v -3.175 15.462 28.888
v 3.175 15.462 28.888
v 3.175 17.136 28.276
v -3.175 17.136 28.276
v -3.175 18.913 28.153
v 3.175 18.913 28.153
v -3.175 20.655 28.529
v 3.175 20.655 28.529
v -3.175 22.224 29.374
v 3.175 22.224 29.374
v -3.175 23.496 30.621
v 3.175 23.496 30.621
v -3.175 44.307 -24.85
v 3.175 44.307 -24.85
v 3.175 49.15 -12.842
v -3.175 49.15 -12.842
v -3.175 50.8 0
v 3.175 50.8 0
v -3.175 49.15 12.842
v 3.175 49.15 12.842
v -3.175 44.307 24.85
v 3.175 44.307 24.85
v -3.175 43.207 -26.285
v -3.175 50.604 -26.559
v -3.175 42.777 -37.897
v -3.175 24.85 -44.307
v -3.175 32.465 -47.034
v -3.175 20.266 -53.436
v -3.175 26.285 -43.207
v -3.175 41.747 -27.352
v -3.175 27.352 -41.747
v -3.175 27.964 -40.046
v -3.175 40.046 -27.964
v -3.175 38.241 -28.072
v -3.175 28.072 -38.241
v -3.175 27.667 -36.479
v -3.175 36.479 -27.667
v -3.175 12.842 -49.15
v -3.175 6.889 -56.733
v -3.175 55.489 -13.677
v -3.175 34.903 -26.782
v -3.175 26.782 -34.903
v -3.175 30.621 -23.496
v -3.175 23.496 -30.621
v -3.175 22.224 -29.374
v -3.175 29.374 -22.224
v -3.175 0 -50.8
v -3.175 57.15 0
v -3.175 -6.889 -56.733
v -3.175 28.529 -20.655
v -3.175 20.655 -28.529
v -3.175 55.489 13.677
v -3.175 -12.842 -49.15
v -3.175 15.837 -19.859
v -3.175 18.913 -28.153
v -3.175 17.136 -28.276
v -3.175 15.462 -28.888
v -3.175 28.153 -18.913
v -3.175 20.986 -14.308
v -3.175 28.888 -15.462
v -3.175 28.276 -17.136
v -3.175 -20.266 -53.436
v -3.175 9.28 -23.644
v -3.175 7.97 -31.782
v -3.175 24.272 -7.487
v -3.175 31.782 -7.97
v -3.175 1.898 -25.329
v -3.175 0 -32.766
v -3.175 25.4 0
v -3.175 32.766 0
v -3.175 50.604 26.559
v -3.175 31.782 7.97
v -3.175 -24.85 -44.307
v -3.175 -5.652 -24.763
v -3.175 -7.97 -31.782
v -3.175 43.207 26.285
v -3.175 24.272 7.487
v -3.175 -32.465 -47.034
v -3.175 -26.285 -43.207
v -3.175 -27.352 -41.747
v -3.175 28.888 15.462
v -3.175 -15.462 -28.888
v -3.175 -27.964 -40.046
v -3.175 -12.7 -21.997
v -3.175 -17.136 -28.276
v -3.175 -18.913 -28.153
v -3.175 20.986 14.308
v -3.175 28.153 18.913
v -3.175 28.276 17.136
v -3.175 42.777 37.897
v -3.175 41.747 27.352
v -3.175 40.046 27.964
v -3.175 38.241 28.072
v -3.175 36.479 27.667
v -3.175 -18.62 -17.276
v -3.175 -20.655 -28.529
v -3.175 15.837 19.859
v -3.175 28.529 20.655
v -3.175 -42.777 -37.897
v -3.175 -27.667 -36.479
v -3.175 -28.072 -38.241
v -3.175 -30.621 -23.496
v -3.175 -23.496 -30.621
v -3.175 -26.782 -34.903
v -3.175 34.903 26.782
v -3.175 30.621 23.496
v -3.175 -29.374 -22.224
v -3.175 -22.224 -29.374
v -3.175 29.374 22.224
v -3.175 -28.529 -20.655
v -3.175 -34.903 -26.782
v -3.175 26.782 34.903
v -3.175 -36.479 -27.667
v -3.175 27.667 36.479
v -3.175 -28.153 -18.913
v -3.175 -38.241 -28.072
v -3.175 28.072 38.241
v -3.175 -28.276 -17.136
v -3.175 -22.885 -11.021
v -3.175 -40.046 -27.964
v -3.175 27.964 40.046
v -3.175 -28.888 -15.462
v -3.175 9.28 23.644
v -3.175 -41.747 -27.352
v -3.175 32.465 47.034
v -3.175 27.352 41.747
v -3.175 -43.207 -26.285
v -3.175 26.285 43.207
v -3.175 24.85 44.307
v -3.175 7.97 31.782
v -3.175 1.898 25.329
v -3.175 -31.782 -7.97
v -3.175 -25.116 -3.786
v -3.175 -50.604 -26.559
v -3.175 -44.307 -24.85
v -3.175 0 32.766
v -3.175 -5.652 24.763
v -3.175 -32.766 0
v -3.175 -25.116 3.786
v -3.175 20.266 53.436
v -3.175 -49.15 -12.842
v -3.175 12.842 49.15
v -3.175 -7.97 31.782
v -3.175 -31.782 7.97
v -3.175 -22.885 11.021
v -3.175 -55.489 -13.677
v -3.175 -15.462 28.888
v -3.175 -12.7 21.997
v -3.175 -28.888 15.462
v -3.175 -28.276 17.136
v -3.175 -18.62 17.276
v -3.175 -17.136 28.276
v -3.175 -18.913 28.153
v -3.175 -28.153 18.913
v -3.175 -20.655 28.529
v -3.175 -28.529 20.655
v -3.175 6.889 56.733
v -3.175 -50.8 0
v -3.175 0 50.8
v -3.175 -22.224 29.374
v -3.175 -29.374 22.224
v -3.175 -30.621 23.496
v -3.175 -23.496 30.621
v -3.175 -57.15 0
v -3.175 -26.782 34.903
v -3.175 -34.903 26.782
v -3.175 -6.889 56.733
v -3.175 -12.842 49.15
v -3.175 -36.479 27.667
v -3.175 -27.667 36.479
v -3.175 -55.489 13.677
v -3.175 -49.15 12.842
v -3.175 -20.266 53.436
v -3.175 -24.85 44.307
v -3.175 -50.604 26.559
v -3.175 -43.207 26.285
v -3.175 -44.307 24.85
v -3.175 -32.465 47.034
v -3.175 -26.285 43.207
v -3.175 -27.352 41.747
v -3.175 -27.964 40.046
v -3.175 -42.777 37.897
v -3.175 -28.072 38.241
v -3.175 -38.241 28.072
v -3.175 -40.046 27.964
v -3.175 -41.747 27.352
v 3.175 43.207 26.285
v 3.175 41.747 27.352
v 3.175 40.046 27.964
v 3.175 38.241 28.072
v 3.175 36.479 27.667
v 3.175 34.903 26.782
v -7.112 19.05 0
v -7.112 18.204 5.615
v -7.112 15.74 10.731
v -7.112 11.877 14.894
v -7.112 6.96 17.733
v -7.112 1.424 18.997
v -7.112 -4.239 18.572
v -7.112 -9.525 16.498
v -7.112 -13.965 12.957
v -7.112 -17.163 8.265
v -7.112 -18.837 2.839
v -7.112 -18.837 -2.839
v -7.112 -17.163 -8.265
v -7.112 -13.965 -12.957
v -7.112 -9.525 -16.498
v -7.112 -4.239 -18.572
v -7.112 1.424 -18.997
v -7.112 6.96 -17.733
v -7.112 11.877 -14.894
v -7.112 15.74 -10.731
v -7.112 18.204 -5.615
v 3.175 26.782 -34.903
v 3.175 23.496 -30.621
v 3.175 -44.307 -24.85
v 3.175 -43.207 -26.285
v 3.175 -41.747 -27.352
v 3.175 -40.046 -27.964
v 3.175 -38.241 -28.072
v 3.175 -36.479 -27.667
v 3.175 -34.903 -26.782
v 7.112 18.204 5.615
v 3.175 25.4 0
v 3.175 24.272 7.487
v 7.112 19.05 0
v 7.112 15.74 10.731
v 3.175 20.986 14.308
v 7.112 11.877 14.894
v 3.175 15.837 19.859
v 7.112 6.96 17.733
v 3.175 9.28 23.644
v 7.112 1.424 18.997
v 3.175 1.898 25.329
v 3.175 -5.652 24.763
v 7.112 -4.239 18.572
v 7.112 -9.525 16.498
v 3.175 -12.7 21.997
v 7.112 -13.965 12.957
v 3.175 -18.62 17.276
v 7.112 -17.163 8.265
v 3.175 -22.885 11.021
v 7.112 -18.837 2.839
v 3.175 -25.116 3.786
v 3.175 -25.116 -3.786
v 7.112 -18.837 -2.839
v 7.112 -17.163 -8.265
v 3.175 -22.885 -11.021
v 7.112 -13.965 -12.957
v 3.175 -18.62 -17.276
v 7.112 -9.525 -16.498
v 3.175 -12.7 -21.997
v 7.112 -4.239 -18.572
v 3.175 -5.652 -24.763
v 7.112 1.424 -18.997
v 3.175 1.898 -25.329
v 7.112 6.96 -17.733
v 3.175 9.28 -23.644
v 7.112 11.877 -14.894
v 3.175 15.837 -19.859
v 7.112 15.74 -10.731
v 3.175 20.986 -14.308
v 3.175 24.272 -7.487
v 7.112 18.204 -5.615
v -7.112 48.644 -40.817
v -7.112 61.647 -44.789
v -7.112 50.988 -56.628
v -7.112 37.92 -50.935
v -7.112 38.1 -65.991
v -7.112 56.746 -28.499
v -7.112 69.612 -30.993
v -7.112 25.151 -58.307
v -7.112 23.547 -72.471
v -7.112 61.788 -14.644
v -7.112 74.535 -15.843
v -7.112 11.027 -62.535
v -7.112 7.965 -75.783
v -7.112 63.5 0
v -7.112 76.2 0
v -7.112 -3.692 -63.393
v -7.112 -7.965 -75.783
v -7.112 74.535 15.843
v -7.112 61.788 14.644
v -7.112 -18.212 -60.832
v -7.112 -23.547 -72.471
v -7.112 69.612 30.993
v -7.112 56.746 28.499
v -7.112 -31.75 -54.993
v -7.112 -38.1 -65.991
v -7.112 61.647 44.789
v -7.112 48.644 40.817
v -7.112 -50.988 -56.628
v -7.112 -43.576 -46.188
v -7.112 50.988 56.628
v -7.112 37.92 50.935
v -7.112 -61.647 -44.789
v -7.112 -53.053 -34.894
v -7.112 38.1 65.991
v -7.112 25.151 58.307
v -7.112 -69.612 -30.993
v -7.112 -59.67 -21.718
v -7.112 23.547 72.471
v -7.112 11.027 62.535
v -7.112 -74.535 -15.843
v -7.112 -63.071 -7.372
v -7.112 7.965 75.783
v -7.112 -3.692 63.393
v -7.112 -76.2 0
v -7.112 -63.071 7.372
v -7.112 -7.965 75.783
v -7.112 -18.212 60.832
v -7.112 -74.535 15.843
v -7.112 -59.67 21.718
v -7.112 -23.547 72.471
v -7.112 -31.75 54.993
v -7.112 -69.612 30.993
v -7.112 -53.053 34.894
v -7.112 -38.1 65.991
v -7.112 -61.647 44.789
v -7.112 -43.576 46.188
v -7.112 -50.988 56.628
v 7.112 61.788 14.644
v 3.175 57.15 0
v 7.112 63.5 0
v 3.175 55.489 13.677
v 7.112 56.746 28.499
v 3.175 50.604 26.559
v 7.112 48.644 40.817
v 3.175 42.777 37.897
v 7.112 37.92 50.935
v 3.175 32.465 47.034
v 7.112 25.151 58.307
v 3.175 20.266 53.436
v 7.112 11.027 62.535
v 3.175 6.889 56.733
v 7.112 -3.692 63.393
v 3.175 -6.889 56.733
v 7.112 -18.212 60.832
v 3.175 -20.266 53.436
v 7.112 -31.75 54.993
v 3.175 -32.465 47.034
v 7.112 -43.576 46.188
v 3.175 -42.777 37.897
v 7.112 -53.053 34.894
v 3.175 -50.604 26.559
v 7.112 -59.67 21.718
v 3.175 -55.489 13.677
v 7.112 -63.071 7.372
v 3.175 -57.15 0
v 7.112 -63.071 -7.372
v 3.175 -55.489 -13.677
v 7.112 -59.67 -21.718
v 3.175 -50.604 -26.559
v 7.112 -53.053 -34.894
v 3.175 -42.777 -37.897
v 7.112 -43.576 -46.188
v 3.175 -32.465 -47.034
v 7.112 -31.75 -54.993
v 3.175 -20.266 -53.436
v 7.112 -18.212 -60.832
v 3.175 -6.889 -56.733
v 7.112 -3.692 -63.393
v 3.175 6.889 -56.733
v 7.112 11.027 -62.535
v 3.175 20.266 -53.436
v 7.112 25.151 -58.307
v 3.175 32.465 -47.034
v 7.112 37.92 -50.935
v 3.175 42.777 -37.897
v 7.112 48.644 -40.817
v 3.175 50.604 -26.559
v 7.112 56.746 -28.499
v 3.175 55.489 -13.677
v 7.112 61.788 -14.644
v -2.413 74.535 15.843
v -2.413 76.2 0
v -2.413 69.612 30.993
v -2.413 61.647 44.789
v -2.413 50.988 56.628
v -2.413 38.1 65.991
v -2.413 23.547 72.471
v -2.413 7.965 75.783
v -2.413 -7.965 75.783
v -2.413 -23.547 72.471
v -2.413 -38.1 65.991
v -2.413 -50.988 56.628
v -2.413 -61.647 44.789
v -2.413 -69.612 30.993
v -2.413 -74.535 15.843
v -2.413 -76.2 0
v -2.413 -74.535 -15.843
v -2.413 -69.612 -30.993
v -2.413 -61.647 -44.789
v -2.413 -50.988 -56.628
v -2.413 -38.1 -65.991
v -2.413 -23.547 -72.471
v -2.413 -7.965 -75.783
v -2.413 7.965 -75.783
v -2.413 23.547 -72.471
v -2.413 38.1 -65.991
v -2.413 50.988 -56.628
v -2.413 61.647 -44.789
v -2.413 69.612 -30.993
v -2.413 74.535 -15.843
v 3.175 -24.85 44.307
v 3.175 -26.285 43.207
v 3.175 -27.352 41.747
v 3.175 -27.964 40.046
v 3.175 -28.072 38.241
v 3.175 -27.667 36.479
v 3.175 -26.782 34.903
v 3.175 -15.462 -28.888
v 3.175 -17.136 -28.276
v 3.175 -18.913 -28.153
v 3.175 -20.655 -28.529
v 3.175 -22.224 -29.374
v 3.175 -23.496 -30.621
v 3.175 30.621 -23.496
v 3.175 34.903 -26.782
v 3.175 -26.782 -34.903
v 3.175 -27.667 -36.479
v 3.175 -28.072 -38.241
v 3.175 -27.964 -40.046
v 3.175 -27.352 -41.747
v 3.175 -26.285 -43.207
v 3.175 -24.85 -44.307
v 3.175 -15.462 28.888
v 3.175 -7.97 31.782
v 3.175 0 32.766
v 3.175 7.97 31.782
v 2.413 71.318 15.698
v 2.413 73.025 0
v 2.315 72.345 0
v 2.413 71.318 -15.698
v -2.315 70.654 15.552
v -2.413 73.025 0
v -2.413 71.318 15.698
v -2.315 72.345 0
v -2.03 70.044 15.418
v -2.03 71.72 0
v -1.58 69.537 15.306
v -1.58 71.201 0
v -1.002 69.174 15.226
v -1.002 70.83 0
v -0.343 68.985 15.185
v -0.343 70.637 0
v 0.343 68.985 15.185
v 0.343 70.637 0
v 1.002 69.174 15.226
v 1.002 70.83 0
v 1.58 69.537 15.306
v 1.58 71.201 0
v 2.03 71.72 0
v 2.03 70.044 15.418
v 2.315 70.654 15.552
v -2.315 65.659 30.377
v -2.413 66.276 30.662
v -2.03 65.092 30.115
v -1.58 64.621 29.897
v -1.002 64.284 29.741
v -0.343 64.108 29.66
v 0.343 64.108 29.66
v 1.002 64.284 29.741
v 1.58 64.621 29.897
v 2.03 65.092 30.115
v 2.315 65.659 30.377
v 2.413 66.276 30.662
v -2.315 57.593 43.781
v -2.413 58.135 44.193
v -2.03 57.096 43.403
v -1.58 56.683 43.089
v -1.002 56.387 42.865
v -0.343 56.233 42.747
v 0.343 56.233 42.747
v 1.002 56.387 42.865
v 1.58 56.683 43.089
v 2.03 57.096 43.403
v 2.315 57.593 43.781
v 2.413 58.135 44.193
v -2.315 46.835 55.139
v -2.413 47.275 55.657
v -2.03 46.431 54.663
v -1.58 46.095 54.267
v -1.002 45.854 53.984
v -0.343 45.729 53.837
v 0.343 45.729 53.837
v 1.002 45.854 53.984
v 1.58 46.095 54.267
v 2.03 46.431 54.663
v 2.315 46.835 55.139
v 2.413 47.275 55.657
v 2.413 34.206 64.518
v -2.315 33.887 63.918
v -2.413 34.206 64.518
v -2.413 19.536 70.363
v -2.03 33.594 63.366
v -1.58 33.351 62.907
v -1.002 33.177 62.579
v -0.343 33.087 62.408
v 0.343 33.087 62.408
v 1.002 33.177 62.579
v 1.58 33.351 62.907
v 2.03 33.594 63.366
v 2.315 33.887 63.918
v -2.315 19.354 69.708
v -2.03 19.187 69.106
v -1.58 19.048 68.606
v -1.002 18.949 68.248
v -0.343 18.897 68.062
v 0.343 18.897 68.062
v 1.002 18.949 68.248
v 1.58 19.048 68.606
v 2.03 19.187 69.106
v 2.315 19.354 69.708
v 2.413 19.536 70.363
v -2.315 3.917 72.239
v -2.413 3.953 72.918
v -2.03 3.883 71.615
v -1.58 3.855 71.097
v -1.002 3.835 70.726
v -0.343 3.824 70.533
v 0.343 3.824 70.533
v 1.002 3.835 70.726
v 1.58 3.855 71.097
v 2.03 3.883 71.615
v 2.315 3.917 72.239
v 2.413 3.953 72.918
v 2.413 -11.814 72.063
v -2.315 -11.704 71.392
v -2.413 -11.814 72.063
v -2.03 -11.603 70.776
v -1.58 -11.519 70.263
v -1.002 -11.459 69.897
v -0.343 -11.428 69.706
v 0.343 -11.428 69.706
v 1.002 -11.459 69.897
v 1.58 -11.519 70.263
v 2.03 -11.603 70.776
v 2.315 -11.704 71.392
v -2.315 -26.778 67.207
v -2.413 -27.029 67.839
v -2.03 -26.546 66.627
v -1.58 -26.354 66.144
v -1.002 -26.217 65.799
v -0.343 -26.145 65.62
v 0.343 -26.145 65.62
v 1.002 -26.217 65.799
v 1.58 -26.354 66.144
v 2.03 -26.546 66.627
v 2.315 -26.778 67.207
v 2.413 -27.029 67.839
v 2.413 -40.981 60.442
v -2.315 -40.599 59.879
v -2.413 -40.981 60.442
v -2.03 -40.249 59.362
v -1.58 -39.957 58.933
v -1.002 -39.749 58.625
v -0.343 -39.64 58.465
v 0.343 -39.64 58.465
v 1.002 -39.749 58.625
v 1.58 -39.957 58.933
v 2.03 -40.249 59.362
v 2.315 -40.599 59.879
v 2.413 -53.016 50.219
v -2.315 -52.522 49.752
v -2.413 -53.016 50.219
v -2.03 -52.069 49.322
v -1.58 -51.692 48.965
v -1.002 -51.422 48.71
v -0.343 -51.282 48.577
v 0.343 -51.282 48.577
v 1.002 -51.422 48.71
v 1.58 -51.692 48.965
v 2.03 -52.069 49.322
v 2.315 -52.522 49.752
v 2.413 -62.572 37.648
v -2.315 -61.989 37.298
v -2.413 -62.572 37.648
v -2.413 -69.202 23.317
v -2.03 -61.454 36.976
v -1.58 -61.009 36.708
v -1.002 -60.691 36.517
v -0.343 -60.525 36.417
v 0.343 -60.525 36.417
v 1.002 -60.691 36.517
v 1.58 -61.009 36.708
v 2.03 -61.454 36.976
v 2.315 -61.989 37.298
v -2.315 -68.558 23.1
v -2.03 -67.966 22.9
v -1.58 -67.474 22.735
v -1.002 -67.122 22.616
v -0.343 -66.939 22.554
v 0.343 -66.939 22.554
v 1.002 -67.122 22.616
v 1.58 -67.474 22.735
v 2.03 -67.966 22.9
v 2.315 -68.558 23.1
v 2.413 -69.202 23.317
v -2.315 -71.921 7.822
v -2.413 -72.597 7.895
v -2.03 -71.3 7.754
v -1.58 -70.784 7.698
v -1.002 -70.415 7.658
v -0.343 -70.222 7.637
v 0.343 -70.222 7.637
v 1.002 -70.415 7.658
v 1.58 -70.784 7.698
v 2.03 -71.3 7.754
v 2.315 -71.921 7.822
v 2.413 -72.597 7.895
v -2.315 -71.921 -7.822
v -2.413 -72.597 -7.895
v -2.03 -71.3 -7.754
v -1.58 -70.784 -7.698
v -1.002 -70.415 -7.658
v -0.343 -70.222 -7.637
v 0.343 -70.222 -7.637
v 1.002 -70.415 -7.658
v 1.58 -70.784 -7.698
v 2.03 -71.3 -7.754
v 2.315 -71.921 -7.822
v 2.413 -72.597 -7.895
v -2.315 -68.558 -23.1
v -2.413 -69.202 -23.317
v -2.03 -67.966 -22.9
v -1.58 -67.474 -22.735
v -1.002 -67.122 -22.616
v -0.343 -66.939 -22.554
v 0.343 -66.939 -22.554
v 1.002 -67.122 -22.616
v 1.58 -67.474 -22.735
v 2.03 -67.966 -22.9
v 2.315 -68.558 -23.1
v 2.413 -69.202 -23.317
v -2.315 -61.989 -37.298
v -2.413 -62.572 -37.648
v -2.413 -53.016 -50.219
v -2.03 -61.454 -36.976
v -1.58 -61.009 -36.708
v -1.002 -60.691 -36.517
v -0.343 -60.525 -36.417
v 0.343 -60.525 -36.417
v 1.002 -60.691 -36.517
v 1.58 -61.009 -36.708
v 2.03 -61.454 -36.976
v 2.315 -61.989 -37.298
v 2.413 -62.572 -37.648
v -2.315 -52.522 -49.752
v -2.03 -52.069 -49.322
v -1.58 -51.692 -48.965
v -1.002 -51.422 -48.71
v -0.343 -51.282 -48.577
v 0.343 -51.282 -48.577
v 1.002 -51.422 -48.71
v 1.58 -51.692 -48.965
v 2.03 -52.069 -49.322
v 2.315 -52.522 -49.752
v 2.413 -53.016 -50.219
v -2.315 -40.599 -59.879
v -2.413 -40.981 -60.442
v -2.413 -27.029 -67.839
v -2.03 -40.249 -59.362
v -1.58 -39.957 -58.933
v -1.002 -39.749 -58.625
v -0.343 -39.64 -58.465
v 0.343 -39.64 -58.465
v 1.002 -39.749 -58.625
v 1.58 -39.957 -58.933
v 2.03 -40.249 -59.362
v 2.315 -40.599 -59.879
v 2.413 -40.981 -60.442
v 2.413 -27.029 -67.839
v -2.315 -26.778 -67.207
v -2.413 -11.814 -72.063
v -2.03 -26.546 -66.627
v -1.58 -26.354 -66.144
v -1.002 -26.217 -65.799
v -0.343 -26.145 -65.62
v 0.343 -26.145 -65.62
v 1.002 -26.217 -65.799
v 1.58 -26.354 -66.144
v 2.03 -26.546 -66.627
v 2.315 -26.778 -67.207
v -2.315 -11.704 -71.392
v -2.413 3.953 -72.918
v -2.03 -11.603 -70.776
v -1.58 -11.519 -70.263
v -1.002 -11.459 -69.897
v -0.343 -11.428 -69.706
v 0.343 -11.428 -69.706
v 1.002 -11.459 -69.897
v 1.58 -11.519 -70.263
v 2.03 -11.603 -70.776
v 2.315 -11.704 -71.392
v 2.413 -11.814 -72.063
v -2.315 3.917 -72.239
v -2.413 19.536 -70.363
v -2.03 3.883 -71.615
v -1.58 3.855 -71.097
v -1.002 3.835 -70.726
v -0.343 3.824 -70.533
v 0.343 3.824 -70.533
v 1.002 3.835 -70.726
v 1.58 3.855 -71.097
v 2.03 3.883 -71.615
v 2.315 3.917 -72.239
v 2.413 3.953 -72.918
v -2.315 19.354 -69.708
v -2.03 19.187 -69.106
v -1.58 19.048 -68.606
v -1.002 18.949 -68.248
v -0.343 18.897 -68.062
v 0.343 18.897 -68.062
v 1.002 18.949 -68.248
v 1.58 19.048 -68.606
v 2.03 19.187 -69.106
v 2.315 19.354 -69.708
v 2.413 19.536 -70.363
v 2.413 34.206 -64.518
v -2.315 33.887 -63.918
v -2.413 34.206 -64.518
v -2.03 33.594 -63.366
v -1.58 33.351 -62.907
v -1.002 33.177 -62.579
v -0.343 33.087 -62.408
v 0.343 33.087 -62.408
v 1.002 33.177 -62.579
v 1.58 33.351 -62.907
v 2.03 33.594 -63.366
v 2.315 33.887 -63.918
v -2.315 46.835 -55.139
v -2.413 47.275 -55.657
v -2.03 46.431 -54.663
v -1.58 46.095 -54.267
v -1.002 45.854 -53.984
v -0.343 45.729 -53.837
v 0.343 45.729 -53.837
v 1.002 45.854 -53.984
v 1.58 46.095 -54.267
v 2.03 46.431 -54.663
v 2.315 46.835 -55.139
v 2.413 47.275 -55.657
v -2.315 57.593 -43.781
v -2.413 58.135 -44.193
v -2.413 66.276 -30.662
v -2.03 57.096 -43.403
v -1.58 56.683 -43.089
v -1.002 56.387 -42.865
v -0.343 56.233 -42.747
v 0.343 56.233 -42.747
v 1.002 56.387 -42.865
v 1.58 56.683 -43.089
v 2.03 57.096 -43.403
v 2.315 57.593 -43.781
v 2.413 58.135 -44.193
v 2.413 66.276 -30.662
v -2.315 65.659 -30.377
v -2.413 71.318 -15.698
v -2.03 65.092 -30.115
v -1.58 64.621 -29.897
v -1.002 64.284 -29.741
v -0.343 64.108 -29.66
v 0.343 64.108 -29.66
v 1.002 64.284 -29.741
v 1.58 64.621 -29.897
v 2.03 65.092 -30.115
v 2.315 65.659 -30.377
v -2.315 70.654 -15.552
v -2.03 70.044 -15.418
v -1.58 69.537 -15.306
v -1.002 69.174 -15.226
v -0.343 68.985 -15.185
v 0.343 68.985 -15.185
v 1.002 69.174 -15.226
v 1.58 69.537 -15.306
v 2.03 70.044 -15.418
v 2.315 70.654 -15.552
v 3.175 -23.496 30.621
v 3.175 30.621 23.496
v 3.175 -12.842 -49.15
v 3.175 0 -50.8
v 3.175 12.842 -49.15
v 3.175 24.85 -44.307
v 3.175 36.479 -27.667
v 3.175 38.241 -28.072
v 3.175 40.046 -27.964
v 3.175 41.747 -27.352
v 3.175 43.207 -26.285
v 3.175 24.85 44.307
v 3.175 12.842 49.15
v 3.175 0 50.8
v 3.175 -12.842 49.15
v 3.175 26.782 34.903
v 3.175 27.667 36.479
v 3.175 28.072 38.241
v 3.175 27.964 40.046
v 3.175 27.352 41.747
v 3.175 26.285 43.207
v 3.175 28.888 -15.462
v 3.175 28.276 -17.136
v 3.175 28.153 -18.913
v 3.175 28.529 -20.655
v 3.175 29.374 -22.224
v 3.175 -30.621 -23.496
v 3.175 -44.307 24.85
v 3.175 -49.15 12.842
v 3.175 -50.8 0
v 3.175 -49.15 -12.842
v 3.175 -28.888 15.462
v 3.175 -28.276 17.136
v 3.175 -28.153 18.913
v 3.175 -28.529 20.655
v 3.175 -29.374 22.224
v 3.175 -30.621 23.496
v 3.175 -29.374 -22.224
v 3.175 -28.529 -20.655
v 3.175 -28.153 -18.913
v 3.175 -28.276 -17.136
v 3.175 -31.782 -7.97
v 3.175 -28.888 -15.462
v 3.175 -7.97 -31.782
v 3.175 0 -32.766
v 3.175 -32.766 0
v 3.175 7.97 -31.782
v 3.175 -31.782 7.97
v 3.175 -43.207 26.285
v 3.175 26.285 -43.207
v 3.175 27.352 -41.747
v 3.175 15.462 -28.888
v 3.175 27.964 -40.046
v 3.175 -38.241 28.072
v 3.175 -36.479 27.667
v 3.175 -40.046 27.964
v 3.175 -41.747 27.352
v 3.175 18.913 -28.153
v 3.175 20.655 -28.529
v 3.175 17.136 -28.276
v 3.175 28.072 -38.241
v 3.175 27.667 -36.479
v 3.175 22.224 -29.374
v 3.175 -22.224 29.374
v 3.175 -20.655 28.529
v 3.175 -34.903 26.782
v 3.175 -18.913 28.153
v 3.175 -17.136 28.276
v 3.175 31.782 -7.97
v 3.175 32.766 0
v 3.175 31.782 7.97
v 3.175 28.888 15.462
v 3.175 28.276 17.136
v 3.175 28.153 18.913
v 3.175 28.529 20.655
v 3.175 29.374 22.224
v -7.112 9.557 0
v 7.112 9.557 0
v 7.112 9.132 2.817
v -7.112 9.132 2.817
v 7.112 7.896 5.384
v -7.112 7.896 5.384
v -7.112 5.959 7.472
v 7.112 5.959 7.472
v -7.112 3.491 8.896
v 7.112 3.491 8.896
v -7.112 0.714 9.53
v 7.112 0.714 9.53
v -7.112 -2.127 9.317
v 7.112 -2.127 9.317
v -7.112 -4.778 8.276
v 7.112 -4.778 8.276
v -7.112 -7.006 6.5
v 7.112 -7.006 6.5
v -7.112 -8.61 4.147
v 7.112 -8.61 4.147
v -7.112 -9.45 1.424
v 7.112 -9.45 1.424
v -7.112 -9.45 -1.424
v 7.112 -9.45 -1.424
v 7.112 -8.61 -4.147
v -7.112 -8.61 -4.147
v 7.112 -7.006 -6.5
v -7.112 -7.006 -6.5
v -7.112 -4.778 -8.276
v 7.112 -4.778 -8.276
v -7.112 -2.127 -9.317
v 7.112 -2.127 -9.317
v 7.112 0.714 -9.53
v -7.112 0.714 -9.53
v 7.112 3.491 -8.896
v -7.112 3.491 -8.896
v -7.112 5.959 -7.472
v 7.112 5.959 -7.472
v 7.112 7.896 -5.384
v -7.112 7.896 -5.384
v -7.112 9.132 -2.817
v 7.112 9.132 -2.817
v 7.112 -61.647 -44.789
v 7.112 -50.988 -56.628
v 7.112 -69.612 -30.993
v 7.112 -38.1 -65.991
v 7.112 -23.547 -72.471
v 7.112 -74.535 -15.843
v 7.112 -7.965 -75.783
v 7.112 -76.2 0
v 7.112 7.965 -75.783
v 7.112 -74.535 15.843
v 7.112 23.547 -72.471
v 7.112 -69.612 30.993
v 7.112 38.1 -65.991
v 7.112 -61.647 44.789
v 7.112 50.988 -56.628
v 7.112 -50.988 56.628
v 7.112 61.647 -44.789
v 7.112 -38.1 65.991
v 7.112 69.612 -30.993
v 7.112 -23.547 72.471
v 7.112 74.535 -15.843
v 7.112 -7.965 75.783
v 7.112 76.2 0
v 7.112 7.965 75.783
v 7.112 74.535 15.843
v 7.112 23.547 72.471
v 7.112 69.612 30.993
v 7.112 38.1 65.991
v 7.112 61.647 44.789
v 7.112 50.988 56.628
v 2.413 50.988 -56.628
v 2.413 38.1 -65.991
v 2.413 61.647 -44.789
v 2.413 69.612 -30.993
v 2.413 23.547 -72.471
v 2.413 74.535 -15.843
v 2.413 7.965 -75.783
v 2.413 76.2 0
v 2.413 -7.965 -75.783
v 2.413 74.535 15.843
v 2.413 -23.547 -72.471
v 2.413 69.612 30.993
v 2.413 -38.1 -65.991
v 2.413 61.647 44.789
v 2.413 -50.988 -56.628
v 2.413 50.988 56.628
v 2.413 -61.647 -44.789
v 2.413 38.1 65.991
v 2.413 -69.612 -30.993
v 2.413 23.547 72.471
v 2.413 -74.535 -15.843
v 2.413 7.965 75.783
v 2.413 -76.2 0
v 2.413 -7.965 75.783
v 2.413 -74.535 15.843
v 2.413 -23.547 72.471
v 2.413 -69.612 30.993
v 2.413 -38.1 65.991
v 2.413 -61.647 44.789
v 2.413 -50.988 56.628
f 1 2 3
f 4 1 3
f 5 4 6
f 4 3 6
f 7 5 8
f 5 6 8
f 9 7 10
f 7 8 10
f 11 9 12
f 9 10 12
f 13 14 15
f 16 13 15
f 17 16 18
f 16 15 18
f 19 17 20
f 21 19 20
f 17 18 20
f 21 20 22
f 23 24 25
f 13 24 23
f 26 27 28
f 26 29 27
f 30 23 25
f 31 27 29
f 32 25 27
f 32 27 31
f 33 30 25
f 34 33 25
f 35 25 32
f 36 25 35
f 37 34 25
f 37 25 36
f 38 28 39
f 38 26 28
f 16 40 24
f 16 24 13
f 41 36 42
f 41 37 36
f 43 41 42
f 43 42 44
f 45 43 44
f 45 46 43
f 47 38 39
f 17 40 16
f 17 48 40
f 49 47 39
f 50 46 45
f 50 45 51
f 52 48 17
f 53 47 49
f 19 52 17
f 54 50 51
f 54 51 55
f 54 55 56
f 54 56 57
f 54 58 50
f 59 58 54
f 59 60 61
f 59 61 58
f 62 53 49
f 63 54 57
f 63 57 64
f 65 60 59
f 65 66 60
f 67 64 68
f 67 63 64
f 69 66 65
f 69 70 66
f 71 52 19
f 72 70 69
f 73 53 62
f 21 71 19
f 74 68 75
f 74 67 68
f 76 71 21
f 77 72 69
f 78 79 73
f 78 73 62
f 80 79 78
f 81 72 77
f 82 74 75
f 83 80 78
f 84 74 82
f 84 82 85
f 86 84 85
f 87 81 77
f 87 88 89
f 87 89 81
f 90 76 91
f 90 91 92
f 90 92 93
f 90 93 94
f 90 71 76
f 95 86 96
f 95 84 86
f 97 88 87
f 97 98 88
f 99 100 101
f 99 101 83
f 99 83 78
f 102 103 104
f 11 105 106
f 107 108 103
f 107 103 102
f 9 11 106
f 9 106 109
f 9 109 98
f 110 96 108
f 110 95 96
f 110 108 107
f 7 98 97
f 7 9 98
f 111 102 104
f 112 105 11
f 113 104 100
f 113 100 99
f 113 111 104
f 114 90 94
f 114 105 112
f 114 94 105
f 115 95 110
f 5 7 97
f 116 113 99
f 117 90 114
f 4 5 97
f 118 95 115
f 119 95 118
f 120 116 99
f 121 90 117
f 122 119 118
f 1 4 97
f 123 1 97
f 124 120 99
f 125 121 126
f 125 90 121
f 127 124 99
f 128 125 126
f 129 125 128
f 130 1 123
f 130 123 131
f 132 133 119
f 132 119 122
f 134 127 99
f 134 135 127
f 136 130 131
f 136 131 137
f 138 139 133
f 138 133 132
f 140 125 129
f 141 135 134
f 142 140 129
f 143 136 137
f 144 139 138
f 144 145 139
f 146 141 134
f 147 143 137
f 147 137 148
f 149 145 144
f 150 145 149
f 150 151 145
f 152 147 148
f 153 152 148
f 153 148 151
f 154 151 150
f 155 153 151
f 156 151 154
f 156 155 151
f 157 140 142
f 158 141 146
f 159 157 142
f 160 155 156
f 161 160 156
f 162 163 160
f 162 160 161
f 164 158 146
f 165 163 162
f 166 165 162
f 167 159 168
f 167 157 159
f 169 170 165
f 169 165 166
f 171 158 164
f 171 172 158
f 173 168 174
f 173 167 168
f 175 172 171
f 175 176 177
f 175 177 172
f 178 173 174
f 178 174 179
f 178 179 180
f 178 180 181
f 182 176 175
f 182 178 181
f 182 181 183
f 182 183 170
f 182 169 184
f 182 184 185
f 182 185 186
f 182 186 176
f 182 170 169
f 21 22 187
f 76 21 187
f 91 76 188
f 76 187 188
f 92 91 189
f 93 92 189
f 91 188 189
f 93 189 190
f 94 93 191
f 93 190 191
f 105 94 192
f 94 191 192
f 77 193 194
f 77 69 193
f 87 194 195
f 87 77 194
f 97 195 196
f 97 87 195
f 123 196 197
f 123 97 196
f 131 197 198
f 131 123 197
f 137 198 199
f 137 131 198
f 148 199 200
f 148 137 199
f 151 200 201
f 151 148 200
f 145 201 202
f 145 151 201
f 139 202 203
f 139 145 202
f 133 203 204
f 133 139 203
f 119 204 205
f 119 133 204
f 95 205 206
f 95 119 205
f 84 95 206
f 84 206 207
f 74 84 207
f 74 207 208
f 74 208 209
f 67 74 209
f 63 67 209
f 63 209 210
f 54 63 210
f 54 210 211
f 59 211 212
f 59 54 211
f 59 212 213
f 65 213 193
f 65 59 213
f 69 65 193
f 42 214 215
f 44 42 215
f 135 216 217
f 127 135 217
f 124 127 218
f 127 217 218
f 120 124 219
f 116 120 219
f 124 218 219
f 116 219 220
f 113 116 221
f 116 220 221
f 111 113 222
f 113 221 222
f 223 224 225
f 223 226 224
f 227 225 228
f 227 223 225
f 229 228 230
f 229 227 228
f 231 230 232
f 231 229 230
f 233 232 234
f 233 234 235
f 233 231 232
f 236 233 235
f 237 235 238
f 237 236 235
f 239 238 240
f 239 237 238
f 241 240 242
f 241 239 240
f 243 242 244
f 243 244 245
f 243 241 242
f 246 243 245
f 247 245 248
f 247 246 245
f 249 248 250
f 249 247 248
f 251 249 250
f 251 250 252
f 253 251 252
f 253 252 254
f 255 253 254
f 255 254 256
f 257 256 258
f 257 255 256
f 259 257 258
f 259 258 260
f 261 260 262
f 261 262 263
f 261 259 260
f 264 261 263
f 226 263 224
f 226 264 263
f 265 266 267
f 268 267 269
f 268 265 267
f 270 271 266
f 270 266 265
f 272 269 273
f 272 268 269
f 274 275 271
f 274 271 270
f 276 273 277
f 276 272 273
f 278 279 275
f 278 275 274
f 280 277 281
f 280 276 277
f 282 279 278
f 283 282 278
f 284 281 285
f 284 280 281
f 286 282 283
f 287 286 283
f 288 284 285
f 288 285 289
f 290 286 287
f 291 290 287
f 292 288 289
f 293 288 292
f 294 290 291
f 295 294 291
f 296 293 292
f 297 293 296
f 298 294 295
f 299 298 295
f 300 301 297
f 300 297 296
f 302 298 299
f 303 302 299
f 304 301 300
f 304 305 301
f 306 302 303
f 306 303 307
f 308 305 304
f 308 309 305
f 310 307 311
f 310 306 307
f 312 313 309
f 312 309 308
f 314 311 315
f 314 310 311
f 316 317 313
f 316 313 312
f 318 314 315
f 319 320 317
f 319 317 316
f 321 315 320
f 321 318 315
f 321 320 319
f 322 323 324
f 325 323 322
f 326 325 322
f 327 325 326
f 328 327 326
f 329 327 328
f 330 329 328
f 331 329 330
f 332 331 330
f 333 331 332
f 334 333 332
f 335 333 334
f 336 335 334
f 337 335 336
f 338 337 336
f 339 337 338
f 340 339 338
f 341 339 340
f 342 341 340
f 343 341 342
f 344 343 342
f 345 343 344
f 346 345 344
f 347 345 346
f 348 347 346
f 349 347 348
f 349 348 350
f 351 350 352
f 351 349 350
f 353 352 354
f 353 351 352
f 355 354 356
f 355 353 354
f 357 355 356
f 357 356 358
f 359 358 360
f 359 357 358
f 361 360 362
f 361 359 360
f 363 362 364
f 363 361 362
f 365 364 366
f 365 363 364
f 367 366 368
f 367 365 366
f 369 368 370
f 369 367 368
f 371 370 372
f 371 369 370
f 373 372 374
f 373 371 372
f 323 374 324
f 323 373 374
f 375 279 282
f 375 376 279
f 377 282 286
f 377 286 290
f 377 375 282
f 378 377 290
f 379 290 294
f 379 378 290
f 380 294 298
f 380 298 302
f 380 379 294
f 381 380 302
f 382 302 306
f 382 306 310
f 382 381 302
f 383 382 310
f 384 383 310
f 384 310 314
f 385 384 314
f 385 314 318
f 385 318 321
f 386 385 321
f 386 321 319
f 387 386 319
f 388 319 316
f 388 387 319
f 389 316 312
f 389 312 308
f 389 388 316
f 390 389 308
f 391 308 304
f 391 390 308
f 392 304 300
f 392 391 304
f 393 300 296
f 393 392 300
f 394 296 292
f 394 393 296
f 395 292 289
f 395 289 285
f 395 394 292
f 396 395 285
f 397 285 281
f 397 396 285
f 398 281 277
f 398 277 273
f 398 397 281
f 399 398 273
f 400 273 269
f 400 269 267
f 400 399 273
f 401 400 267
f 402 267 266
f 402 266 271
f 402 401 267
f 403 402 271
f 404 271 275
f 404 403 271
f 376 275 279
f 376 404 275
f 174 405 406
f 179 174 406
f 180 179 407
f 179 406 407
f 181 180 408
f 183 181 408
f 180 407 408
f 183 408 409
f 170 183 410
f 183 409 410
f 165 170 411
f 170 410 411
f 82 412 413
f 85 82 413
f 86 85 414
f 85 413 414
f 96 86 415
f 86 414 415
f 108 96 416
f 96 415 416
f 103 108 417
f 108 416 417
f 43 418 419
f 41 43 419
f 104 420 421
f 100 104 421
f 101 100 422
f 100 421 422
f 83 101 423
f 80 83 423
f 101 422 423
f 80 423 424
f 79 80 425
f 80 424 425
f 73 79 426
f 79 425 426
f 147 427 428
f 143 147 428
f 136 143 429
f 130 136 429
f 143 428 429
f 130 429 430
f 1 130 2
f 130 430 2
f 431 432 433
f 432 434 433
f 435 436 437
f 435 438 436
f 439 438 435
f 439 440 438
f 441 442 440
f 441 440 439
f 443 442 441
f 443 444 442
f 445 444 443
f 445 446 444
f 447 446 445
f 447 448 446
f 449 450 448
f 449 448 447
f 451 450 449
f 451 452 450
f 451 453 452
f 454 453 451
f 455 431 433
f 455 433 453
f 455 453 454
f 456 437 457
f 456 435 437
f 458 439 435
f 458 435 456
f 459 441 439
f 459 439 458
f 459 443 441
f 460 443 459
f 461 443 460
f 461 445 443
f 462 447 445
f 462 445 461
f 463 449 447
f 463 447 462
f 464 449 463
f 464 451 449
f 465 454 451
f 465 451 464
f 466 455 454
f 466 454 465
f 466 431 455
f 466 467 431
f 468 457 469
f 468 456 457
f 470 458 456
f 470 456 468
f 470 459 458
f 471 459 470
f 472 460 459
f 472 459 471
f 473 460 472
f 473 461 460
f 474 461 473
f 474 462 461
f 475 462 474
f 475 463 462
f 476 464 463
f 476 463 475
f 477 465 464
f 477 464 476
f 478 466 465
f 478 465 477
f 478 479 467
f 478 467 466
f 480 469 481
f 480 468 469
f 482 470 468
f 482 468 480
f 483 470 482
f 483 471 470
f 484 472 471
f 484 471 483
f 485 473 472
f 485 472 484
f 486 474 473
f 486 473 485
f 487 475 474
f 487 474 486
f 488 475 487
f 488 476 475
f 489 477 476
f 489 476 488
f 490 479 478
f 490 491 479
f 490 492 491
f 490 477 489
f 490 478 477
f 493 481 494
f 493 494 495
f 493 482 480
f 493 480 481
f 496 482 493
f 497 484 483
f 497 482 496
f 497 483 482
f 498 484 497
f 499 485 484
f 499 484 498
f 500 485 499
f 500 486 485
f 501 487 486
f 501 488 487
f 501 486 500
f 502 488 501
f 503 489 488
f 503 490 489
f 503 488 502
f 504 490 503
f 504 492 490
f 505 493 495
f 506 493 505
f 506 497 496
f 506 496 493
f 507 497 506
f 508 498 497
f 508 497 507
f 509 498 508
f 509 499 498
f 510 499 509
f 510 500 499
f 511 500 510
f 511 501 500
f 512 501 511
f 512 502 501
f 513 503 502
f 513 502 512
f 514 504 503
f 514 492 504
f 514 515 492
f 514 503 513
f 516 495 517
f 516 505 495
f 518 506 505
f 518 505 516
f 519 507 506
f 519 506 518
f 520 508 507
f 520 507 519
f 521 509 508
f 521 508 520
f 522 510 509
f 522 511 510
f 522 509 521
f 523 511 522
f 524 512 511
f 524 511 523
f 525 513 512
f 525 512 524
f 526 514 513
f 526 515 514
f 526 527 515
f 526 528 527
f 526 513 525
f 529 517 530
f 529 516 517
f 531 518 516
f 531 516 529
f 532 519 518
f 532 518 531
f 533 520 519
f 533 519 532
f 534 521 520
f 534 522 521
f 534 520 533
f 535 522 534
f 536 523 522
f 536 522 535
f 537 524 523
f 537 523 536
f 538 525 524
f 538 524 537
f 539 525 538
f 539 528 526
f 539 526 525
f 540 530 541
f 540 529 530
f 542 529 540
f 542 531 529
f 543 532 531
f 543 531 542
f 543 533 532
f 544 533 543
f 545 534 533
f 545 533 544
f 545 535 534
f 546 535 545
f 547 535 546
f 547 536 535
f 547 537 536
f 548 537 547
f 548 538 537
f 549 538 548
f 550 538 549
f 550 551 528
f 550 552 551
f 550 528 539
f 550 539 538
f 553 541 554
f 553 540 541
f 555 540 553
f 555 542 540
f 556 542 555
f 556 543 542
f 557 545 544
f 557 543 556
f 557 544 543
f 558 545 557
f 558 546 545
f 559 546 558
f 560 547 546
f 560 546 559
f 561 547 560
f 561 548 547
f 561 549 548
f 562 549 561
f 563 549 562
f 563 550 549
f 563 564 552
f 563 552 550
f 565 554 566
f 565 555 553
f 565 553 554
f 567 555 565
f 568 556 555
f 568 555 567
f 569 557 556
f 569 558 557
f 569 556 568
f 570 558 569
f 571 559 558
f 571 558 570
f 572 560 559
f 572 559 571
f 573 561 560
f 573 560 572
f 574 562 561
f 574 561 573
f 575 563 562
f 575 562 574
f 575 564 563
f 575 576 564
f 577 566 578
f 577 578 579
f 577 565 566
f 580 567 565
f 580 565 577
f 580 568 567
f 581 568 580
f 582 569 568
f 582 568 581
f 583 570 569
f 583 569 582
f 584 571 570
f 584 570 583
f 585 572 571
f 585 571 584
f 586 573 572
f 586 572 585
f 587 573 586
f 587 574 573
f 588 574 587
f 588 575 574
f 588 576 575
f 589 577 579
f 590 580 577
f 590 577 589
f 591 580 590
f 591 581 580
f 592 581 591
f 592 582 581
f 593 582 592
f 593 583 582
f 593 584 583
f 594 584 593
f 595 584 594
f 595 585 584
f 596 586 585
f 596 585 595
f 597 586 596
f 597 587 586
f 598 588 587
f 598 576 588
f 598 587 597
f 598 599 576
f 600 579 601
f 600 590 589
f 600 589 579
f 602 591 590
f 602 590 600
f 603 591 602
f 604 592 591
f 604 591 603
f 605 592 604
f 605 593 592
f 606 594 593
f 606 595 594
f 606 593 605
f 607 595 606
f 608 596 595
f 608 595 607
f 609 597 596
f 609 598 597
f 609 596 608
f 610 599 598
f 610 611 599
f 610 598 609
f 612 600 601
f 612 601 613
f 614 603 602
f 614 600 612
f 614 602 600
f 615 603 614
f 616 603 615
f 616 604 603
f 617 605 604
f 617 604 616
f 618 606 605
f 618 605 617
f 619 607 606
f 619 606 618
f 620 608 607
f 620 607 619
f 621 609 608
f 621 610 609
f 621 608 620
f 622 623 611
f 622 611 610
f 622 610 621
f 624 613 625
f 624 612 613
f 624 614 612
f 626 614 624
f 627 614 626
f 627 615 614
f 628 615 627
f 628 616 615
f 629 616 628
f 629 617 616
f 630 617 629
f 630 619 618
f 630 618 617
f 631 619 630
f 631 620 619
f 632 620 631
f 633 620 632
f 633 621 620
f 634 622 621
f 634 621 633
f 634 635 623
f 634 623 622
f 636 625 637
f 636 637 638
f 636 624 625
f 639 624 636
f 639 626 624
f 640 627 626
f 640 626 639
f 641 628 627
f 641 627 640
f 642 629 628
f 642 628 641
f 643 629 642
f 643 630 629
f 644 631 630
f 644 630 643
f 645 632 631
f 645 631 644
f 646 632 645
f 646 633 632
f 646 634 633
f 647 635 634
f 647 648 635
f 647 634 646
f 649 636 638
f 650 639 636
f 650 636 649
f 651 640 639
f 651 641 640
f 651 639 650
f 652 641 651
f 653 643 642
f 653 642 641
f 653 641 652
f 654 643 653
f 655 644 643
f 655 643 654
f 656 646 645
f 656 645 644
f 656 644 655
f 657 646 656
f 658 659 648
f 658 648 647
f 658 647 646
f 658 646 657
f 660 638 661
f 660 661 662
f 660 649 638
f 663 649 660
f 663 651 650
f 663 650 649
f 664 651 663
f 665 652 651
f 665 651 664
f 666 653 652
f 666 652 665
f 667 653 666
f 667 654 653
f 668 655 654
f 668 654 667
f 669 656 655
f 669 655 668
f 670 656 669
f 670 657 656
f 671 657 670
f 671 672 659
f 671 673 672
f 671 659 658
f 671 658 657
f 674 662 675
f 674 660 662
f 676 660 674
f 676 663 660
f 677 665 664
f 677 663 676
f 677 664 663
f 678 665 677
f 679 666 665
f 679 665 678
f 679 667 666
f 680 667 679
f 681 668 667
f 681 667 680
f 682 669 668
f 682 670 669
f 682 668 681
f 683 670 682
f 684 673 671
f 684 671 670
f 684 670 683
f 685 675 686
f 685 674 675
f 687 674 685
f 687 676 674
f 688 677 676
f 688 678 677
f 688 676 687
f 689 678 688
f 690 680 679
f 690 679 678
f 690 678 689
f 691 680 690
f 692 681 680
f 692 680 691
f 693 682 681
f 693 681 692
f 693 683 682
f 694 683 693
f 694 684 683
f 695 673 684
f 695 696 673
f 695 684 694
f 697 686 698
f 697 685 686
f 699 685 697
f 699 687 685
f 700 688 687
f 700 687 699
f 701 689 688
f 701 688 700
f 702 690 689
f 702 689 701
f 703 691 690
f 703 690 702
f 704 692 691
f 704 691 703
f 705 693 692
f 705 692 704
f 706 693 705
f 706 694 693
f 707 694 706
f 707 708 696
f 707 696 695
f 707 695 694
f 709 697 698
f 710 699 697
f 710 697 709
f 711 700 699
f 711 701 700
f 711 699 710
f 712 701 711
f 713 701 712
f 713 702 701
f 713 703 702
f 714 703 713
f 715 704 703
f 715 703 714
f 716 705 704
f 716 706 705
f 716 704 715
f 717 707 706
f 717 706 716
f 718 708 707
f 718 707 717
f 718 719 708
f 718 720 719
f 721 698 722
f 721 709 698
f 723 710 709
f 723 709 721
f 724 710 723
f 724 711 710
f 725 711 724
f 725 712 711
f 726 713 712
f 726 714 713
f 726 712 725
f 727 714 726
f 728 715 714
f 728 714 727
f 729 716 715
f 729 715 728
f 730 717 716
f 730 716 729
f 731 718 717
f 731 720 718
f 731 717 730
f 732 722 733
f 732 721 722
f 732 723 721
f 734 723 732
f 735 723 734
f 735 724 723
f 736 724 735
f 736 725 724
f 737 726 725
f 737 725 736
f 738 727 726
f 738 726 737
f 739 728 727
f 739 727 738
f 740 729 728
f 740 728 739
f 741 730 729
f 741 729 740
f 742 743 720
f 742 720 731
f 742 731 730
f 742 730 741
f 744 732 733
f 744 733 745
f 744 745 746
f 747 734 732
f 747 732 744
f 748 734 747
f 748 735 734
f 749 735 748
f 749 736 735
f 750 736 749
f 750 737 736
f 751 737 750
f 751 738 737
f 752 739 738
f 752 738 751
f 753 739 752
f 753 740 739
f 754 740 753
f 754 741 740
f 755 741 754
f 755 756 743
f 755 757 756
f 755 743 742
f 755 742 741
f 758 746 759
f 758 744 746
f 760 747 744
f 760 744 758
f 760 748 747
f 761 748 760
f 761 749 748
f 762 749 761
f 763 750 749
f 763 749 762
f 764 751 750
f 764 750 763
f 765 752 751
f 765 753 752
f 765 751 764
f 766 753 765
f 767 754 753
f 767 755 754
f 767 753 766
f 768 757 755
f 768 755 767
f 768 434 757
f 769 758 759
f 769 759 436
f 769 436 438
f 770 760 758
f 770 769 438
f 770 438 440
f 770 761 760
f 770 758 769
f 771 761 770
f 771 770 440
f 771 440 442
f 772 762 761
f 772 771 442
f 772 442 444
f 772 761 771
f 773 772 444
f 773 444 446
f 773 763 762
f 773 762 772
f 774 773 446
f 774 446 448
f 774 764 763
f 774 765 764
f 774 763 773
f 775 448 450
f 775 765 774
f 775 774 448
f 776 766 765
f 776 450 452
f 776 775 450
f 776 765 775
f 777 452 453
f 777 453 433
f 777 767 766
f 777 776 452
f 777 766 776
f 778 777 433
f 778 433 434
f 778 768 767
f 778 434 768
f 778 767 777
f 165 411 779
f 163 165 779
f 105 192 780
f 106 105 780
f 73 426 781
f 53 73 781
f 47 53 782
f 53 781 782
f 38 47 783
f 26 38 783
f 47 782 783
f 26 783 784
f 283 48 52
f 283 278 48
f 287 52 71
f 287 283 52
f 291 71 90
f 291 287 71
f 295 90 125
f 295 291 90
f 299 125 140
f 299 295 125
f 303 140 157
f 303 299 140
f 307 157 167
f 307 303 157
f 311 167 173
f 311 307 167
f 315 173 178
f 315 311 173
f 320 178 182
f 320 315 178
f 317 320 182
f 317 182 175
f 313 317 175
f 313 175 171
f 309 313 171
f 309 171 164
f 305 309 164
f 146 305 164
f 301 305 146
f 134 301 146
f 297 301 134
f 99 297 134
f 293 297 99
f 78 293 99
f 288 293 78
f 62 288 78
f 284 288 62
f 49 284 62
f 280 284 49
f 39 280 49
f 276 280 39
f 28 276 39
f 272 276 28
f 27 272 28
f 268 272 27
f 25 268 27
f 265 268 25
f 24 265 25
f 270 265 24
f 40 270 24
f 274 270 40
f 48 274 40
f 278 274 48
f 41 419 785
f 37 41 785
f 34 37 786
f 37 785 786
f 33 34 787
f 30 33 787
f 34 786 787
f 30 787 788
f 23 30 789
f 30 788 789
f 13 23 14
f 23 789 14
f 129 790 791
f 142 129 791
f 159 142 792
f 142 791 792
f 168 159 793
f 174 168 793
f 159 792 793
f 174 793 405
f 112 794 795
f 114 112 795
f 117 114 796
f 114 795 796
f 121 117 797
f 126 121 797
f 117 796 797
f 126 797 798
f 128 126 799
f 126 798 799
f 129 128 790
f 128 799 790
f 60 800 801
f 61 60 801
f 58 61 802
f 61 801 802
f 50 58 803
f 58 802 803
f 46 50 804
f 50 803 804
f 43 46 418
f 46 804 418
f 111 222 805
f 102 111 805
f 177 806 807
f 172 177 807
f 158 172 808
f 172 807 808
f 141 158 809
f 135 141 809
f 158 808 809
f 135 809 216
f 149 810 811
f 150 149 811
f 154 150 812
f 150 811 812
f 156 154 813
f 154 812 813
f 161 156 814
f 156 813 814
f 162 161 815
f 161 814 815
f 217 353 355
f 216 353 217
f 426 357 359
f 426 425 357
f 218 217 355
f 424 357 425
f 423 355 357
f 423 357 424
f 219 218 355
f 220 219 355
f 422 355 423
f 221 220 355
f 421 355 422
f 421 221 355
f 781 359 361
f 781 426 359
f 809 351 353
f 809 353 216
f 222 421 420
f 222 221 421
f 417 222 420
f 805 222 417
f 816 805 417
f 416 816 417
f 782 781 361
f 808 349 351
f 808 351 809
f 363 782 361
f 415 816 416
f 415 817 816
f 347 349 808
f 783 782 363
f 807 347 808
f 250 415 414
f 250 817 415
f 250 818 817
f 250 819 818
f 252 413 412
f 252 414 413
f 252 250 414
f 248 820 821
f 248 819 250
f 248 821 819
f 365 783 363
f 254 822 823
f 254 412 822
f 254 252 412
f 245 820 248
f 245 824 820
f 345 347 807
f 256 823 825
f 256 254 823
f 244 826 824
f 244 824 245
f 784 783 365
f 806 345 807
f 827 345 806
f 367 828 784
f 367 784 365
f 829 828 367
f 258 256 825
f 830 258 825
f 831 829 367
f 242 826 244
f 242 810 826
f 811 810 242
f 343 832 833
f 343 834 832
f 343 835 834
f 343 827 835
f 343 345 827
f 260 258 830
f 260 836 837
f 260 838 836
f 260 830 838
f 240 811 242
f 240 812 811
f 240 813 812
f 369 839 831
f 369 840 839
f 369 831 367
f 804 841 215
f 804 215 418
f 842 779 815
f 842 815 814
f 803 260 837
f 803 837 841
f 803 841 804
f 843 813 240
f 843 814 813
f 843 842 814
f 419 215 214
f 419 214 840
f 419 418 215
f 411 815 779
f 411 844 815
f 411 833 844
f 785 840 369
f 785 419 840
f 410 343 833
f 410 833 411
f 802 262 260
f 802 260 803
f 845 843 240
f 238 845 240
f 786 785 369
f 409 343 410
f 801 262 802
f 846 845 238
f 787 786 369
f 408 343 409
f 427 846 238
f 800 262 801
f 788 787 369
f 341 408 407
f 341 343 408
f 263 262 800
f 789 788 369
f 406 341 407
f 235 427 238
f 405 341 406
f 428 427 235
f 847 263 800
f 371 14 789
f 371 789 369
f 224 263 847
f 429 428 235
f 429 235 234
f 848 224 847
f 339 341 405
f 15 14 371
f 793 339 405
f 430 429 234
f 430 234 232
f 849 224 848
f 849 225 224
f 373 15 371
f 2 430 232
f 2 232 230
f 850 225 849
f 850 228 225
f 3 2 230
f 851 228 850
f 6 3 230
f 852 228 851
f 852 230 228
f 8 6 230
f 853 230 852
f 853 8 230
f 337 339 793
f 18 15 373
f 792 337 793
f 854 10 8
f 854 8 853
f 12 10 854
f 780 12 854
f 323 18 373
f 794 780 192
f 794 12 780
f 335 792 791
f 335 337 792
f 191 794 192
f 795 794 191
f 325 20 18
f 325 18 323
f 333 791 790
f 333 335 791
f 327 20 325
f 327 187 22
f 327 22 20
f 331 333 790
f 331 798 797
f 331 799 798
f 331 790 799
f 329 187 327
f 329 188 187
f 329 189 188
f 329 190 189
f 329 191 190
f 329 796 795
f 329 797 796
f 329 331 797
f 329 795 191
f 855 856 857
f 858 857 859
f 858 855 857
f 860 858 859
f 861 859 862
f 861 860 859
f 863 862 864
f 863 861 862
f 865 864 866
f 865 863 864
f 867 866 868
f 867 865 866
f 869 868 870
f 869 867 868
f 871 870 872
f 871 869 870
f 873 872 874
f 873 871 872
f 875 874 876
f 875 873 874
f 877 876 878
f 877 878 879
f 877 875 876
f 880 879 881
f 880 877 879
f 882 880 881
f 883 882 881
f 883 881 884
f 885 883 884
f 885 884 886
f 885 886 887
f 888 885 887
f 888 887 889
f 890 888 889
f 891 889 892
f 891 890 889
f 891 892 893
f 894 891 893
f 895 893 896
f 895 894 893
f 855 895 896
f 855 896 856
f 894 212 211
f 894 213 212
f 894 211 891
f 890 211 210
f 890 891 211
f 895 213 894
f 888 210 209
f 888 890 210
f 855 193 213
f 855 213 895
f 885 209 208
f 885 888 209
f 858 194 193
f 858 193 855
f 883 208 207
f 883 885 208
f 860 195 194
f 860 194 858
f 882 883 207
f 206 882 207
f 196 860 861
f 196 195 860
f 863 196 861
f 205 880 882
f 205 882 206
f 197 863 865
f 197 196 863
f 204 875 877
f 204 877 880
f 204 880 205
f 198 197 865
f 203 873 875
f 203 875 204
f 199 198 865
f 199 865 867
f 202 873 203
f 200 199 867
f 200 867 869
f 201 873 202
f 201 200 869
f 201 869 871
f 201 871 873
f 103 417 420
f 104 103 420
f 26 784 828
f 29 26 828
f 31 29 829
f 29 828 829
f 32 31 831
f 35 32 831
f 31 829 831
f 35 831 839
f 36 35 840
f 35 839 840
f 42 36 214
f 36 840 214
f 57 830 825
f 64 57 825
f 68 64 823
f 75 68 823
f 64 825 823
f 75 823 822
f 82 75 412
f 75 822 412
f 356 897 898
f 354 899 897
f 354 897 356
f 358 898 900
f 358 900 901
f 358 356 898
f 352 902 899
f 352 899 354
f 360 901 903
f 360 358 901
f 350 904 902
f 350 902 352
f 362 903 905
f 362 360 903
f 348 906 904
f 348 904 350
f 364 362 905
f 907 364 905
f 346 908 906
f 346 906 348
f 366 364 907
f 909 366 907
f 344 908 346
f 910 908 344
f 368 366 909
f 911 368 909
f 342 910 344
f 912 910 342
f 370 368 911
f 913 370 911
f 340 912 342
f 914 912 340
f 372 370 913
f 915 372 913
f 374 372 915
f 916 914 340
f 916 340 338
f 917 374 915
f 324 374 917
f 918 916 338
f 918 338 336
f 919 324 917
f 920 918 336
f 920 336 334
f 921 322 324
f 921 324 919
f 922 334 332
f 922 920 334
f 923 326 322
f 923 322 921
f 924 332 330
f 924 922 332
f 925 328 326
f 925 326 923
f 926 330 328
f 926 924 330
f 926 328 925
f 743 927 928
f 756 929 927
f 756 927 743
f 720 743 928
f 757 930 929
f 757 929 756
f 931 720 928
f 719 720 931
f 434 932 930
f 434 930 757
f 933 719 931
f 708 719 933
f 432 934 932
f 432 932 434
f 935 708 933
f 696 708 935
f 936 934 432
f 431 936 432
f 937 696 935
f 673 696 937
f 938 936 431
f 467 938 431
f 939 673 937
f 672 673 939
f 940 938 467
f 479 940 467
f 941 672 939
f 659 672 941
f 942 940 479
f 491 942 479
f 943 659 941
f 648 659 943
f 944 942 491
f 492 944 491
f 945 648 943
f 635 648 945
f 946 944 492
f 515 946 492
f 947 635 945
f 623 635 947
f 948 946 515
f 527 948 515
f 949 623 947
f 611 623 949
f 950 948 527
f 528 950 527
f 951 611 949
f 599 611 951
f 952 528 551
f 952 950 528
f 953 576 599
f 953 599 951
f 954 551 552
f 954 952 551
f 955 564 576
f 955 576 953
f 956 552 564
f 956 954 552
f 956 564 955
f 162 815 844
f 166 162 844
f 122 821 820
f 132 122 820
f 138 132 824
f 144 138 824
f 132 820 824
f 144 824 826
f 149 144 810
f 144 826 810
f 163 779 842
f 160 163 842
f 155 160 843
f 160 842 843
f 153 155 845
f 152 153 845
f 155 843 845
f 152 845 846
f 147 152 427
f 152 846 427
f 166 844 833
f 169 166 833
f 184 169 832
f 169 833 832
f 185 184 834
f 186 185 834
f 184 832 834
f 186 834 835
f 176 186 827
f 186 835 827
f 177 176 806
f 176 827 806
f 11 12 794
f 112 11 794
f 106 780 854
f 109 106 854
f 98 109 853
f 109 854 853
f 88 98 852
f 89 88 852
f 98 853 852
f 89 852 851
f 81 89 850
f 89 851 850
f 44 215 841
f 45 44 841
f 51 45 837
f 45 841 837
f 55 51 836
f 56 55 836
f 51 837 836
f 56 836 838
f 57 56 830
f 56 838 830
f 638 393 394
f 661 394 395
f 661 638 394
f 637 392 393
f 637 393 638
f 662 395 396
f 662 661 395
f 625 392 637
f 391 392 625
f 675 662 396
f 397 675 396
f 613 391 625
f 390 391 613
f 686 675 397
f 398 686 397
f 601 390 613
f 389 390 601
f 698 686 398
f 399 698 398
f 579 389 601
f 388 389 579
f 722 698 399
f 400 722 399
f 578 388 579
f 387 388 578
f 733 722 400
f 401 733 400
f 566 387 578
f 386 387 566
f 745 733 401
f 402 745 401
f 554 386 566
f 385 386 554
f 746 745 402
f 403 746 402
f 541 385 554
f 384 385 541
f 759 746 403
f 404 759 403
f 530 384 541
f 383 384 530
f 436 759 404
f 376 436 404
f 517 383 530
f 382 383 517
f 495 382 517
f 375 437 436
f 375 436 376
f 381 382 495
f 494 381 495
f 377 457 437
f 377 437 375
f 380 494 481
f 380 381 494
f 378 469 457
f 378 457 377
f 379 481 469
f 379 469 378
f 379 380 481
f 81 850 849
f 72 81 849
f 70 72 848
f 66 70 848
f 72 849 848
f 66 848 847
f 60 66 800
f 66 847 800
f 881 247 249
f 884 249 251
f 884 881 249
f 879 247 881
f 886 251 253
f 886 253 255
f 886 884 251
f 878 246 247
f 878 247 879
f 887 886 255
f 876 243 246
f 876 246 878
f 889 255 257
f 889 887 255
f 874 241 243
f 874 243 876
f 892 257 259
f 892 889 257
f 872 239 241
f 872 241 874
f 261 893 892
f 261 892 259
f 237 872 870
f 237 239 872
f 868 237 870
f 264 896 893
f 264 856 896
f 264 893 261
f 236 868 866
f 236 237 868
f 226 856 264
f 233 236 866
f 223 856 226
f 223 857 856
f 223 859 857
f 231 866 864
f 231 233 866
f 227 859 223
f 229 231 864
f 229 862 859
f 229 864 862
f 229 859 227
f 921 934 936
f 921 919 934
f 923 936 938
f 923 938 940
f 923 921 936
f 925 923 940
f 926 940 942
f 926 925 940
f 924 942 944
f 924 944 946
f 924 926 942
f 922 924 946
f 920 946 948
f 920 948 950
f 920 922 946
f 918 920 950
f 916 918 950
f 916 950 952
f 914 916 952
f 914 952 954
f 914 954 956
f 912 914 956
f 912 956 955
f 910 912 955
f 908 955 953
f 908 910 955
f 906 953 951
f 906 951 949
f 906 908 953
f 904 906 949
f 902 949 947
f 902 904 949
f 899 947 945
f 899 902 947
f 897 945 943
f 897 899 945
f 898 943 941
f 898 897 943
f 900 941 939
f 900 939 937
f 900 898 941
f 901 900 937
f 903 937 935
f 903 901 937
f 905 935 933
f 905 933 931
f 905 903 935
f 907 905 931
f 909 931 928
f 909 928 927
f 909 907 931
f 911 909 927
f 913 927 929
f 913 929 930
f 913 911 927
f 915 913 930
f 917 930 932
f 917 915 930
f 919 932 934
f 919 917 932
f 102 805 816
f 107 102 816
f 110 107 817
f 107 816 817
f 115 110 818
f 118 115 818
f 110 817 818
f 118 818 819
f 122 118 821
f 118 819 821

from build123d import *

# Parameters (mm, degrees)
CUT_EXTRUDE1_DEPTH = 6.35
CIRPATTERN1_COUNT  = 4


with BuildPart() as part:
    # Sketch1 → Revolve1 (revolve)
    with BuildSketch(Plane.XY):
        with BuildLine():
            Line((-7.112, 19.05), (-3.175, 25.4))
            Line((-3.175, 25.4), (-3.175, 57.15))
            Line((-3.175, 57.15), (-7.112, 63.5))
            Line((-7.112, 63.5), (-7.112, 76.2))
            Line((-7.112, 76.2), (-2.413, 76.2))
            Line((-2.413, 76.2), (-2.413, 73.025))
            ThreePointArc((-2.413, 73.025), (0, 70.612), (2.413, 73.025))
            Line((2.413, 73.025), (2.413, 76.2))
            Line((2.413, 76.2), (7.112, 76.2))
            Line((7.112, 76.2), (7.112, 63.5))
            Line((7.112, 63.5), (3.175, 57.15))
            Line((3.175, 57.15), (3.175, 25.4))
            Line((3.175, 25.4), (7.112, 19.05))
            Line((7.112, 19.05), (7.112, 9.55675))
            Line((7.112, 9.55675), (-7.112, 9.55675))
            Line((-7.112, 9.55675), (-7.112, 19.05))
        make_face()
    revolve(axis=Axis((0, 0, 0), (1, 0, 0)))

    # Sketch2 → Cut-Extrude1 (cut)
    with BuildSketch(Plane(origin=(3.175, 0, 0), x_dir=(0, 0, -1), z_dir=(1, 0, 0))):
        with BuildLine():
            Line((23.49644805, 30.621167271), (26.781905408, 34.902858661))
            ThreePointArc((26.781905408, 34.902858661), (27.96426729, 40.046055634), (24.850413368, 44.306849983))
            ThreePointArc((24.850413368, 44.306849983), (0, 50.8), (-24.850413368, 44.306849983))
            ThreePointArc((-24.850413368, 44.306849983), (-27.96426729, 40.046055634), (-26.781905408, 34.902858661))
            Line((-26.781905408, 34.902858661), (-23.49644805, 30.621167271))
            ThreePointArc((-23.49644805, 30.621167271), (-19.797458156, 28.279540119), (-15.462119544, 28.888295471))
            ThreePointArc((-15.462119544, 28.888295471), (0, 32.766), (15.462119544, 28.888295471))
            ThreePointArc((15.462119544, 28.888295471), (19.797458156, 28.279540119), (23.49644805, 30.621167271))
        make_face()
    cut_extrude1 = extrude(amount=-CUT_EXTRUDE1_DEPTH, mode=Mode.SUBTRACT)

    # CirPattern1: Cut-Extrude1 ×4 about axis
    cirpattern1_axis = Axis((0, 0, 0), (1, 0, 0))
    for i in range(1, CIRPATTERN1_COUNT):
        add(cut_extrude1.rotate(cirpattern1_axis, i * 360 / CIRPATTERN1_COUNT), mode=Mode.SUBTRACT)


solid = part.part
